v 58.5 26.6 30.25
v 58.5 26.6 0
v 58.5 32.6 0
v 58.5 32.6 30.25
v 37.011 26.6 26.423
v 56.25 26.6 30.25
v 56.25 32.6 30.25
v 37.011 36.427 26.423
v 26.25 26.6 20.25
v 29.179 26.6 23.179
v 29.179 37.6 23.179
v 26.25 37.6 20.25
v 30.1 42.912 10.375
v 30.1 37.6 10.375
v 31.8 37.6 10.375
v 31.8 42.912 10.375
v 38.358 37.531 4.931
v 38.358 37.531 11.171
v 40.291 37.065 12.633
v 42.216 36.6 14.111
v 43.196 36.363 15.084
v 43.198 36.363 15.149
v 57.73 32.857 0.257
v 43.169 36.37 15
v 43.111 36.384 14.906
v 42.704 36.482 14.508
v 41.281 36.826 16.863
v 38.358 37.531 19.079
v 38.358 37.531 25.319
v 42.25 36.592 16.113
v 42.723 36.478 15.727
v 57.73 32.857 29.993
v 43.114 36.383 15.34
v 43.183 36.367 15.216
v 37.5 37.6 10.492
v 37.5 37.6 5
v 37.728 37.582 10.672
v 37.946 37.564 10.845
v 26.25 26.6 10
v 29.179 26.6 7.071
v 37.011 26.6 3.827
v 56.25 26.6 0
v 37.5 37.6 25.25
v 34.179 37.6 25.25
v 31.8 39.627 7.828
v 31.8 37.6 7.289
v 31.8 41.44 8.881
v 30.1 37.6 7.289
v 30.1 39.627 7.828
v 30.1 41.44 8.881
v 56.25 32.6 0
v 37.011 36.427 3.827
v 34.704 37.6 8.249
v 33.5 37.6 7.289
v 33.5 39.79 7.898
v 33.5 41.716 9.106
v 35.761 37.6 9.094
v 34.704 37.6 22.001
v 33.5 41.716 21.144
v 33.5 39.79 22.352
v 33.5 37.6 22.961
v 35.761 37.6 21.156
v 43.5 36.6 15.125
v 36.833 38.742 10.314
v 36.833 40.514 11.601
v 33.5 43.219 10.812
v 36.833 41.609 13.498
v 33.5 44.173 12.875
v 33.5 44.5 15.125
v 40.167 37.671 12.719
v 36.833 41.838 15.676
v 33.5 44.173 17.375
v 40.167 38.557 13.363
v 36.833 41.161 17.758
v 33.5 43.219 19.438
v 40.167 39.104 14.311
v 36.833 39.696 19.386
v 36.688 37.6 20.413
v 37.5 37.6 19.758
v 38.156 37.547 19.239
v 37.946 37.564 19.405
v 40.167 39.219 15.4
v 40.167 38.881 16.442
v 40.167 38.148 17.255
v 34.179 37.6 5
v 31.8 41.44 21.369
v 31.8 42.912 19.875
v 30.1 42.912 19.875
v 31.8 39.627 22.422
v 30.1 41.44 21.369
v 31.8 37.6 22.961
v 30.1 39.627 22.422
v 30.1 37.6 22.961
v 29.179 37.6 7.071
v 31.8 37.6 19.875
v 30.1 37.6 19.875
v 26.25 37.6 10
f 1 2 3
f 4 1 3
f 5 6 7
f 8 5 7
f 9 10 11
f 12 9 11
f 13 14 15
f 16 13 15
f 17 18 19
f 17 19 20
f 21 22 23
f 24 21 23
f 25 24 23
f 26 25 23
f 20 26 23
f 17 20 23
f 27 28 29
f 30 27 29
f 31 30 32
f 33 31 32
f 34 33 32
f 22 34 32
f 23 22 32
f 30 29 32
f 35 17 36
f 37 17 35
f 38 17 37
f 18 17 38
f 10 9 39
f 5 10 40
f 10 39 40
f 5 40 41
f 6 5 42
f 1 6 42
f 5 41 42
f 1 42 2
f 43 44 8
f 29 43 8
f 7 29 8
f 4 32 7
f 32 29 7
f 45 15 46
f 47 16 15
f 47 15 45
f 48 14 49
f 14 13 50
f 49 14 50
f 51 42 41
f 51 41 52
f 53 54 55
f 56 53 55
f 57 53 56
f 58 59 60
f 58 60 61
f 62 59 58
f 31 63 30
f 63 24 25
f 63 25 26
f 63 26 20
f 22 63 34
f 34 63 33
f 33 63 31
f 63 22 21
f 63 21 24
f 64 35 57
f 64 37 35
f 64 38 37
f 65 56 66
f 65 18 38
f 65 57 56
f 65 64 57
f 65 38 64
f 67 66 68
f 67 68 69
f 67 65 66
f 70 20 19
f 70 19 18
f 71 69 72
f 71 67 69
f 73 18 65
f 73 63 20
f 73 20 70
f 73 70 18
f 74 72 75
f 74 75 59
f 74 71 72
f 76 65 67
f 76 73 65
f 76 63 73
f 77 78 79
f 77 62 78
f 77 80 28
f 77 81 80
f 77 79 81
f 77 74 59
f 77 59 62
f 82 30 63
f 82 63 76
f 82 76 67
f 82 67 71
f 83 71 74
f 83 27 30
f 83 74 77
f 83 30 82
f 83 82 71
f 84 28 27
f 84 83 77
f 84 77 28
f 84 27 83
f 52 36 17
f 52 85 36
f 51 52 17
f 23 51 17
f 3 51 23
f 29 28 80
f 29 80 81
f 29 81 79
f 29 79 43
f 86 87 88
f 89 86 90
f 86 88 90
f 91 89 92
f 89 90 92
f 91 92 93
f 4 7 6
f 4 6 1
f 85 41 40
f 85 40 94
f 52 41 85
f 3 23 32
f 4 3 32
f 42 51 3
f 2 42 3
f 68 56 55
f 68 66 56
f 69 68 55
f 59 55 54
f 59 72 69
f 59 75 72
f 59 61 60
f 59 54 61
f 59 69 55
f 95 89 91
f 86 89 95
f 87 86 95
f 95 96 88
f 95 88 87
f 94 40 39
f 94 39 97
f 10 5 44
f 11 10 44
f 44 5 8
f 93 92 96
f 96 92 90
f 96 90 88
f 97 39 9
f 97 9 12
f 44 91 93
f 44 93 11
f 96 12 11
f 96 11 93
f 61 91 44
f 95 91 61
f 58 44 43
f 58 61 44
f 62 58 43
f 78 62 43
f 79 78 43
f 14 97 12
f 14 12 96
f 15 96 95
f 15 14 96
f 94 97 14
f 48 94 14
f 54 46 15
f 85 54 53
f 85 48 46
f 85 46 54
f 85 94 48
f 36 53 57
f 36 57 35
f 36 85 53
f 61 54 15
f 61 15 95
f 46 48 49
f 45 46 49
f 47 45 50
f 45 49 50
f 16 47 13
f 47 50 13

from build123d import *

# Parameters (mm, degrees)
BOX020_W          = 71.8
BOX020_H          = 12
BOX020_DEPTH      = 9.5
CYLINDER024_R     = 7.9
CYLINDER024_DEPTH = 1.7
BOX002_W          = 32.25
BOX002_H          = 11
BOX002_DEPTH      = 30.25
CHAMFER_SIZE2     = 15
CHAMFER_SIZE      = 5
CHAMFER001_SIZE   = 5
CHAMFER002_SIZE   = 5
CHAMFER003_SIZE   = 10
CHAMFER004_SIZE   = 10
CHAMFER005_SIZE   = 10
CHAMFER006_SIZE   = 5
CHAMFER007_SIZE   = 1
CHAMFER008_SIZE   = 10


with BuildPart() as syr_plane003:
    # Box020 → Box020 (new body)
    with BuildSketch(Plane(origin=(-40, 36.6, 10.375), x_dir=(1, 0, 0), z_dir=(0, 0, 1))):
        with Locations((35.9, 6)):
            Rectangle(BOX020_W, BOX020_H)
    extrude(amount=BOX020_DEPTH)


with BuildPart() as syr_base_holder:
    # Cylinder024 → Cylinder024 (new body)
    with BuildSketch(Plane(origin=(30.1, 36.6, 15.125), x_dir=(0, 0, -1), z_dir=(1, 0, 0))):
        Circle(CYLINDER024_R)
    extrude(amount=CYLINDER024_DEPTH)

    # Cut001: cut syr_plane003
    add(syr_plane003.part, mode=Mode.SUBTRACT)


with BuildPart() as plunger_support:
    # Cone002 → Cone002 (revolve)
    with BuildSketch(Plane(origin=(33.5, 36.6, 15.125), x_dir=(0, 0, -1), z_dir=(0, -1, 0))):
        Polygon((0, 0), (7.9, 0), (0, 10), align=None)
    revolve(axis=Axis((33.5, 36.6, 15.125), (1, 0, 0)))


with BuildPart() as fusion009:
    # Box002 → Box002 (new body)
    with BuildSketch(Plane(origin=(26.25, 26.6, 0), x_dir=(1, 0, 0), z_dir=(0, 0, 1))):
        with Locations((16.125, 5.5)):
            Rectangle(BOX002_W, BOX002_H)
    extrude(amount=BOX002_DEPTH)

    # Chamfer
    chamfer_edges = [fusion009.edges().sort_by_distance(p)[0] for p in [
        (58.5, 37.6, 15.125),
    ]]
    chamfer_side = fusion009.faces().sort_by_distance((58.5, 32.1, 15.125))[0]
    chamfer(chamfer_edges, length=CHAMFER_SIZE, length2=CHAMFER_SIZE2, reference=chamfer_side)

    # Chamfer001
    chamfer001_edges = [fusion009.edges().sort_by_distance(p)[0] for p in [
        (34.875, 37.6, 30.25),
    ]]
    chamfer(chamfer001_edges, length=CHAMFER001_SIZE)

    # Chamfer002
    chamfer002_edges = [fusion009.edges().sort_by_distance(p)[0] for p in [
        (34.875, 37.6, 0),
    ]]
    chamfer(chamfer002_edges, length=CHAMFER002_SIZE)

    # Chamfer003
    chamfer003_edges = [fusion009.edges().sort_by_distance(p)[0] for p in [
        (26.25, 29.6, 0),
        (26.25, 29.6, 30.25),
    ]]
    chamfer(chamfer003_edges, length=CHAMFER003_SIZE)

    # Chamfer004
    chamfer004_edges = [fusion009.edges().sort_by_distance(p)[0] for p in [
        (36.25, 29.6, 0),
        (36.25, 29.6, 30.25),
    ]]
    chamfer(chamfer004_edges, length=CHAMFER004_SIZE)

    # Chamfer005
    chamfer005_edges = [fusion009.edges().sort_by_distance(p)[0] for p in [
        (46.25, 29.6, 30.25),
        (46.25, 29.6, 0),
    ]]
    chamfer(chamfer005_edges, length=CHAMFER005_SIZE)

    # Chamfer006
    chamfer006_edges = [fusion009.edges().sort_by_distance(p)[0] for p in [
        (43.5, 37.6, 15.125),
    ]]
    chamfer(chamfer006_edges, length=CHAMFER006_SIZE)

    # Chamfer007
    chamfer007_edges = [fusion009.edges().sort_by_distance(p)[0] for p in [
        (38.5, 37.6, 15.125),
    ]]
    chamfer(chamfer007_edges, length=CHAMFER007_SIZE)

    # Chamfer008
    chamfer008_edges = [fusion009.edges().sort_by_distance(p)[0] for p in [
        (48.243416, 36.018861, 15.125),
    ]]
    chamfer(chamfer008_edges, length=CHAMFER008_SIZE)

    # Fusion008: union plunger_support
    add(plunger_support.part)

    # Fusion009: union syr_base_holder
    add(syr_base_holder.part)


solid = fusion009.part
